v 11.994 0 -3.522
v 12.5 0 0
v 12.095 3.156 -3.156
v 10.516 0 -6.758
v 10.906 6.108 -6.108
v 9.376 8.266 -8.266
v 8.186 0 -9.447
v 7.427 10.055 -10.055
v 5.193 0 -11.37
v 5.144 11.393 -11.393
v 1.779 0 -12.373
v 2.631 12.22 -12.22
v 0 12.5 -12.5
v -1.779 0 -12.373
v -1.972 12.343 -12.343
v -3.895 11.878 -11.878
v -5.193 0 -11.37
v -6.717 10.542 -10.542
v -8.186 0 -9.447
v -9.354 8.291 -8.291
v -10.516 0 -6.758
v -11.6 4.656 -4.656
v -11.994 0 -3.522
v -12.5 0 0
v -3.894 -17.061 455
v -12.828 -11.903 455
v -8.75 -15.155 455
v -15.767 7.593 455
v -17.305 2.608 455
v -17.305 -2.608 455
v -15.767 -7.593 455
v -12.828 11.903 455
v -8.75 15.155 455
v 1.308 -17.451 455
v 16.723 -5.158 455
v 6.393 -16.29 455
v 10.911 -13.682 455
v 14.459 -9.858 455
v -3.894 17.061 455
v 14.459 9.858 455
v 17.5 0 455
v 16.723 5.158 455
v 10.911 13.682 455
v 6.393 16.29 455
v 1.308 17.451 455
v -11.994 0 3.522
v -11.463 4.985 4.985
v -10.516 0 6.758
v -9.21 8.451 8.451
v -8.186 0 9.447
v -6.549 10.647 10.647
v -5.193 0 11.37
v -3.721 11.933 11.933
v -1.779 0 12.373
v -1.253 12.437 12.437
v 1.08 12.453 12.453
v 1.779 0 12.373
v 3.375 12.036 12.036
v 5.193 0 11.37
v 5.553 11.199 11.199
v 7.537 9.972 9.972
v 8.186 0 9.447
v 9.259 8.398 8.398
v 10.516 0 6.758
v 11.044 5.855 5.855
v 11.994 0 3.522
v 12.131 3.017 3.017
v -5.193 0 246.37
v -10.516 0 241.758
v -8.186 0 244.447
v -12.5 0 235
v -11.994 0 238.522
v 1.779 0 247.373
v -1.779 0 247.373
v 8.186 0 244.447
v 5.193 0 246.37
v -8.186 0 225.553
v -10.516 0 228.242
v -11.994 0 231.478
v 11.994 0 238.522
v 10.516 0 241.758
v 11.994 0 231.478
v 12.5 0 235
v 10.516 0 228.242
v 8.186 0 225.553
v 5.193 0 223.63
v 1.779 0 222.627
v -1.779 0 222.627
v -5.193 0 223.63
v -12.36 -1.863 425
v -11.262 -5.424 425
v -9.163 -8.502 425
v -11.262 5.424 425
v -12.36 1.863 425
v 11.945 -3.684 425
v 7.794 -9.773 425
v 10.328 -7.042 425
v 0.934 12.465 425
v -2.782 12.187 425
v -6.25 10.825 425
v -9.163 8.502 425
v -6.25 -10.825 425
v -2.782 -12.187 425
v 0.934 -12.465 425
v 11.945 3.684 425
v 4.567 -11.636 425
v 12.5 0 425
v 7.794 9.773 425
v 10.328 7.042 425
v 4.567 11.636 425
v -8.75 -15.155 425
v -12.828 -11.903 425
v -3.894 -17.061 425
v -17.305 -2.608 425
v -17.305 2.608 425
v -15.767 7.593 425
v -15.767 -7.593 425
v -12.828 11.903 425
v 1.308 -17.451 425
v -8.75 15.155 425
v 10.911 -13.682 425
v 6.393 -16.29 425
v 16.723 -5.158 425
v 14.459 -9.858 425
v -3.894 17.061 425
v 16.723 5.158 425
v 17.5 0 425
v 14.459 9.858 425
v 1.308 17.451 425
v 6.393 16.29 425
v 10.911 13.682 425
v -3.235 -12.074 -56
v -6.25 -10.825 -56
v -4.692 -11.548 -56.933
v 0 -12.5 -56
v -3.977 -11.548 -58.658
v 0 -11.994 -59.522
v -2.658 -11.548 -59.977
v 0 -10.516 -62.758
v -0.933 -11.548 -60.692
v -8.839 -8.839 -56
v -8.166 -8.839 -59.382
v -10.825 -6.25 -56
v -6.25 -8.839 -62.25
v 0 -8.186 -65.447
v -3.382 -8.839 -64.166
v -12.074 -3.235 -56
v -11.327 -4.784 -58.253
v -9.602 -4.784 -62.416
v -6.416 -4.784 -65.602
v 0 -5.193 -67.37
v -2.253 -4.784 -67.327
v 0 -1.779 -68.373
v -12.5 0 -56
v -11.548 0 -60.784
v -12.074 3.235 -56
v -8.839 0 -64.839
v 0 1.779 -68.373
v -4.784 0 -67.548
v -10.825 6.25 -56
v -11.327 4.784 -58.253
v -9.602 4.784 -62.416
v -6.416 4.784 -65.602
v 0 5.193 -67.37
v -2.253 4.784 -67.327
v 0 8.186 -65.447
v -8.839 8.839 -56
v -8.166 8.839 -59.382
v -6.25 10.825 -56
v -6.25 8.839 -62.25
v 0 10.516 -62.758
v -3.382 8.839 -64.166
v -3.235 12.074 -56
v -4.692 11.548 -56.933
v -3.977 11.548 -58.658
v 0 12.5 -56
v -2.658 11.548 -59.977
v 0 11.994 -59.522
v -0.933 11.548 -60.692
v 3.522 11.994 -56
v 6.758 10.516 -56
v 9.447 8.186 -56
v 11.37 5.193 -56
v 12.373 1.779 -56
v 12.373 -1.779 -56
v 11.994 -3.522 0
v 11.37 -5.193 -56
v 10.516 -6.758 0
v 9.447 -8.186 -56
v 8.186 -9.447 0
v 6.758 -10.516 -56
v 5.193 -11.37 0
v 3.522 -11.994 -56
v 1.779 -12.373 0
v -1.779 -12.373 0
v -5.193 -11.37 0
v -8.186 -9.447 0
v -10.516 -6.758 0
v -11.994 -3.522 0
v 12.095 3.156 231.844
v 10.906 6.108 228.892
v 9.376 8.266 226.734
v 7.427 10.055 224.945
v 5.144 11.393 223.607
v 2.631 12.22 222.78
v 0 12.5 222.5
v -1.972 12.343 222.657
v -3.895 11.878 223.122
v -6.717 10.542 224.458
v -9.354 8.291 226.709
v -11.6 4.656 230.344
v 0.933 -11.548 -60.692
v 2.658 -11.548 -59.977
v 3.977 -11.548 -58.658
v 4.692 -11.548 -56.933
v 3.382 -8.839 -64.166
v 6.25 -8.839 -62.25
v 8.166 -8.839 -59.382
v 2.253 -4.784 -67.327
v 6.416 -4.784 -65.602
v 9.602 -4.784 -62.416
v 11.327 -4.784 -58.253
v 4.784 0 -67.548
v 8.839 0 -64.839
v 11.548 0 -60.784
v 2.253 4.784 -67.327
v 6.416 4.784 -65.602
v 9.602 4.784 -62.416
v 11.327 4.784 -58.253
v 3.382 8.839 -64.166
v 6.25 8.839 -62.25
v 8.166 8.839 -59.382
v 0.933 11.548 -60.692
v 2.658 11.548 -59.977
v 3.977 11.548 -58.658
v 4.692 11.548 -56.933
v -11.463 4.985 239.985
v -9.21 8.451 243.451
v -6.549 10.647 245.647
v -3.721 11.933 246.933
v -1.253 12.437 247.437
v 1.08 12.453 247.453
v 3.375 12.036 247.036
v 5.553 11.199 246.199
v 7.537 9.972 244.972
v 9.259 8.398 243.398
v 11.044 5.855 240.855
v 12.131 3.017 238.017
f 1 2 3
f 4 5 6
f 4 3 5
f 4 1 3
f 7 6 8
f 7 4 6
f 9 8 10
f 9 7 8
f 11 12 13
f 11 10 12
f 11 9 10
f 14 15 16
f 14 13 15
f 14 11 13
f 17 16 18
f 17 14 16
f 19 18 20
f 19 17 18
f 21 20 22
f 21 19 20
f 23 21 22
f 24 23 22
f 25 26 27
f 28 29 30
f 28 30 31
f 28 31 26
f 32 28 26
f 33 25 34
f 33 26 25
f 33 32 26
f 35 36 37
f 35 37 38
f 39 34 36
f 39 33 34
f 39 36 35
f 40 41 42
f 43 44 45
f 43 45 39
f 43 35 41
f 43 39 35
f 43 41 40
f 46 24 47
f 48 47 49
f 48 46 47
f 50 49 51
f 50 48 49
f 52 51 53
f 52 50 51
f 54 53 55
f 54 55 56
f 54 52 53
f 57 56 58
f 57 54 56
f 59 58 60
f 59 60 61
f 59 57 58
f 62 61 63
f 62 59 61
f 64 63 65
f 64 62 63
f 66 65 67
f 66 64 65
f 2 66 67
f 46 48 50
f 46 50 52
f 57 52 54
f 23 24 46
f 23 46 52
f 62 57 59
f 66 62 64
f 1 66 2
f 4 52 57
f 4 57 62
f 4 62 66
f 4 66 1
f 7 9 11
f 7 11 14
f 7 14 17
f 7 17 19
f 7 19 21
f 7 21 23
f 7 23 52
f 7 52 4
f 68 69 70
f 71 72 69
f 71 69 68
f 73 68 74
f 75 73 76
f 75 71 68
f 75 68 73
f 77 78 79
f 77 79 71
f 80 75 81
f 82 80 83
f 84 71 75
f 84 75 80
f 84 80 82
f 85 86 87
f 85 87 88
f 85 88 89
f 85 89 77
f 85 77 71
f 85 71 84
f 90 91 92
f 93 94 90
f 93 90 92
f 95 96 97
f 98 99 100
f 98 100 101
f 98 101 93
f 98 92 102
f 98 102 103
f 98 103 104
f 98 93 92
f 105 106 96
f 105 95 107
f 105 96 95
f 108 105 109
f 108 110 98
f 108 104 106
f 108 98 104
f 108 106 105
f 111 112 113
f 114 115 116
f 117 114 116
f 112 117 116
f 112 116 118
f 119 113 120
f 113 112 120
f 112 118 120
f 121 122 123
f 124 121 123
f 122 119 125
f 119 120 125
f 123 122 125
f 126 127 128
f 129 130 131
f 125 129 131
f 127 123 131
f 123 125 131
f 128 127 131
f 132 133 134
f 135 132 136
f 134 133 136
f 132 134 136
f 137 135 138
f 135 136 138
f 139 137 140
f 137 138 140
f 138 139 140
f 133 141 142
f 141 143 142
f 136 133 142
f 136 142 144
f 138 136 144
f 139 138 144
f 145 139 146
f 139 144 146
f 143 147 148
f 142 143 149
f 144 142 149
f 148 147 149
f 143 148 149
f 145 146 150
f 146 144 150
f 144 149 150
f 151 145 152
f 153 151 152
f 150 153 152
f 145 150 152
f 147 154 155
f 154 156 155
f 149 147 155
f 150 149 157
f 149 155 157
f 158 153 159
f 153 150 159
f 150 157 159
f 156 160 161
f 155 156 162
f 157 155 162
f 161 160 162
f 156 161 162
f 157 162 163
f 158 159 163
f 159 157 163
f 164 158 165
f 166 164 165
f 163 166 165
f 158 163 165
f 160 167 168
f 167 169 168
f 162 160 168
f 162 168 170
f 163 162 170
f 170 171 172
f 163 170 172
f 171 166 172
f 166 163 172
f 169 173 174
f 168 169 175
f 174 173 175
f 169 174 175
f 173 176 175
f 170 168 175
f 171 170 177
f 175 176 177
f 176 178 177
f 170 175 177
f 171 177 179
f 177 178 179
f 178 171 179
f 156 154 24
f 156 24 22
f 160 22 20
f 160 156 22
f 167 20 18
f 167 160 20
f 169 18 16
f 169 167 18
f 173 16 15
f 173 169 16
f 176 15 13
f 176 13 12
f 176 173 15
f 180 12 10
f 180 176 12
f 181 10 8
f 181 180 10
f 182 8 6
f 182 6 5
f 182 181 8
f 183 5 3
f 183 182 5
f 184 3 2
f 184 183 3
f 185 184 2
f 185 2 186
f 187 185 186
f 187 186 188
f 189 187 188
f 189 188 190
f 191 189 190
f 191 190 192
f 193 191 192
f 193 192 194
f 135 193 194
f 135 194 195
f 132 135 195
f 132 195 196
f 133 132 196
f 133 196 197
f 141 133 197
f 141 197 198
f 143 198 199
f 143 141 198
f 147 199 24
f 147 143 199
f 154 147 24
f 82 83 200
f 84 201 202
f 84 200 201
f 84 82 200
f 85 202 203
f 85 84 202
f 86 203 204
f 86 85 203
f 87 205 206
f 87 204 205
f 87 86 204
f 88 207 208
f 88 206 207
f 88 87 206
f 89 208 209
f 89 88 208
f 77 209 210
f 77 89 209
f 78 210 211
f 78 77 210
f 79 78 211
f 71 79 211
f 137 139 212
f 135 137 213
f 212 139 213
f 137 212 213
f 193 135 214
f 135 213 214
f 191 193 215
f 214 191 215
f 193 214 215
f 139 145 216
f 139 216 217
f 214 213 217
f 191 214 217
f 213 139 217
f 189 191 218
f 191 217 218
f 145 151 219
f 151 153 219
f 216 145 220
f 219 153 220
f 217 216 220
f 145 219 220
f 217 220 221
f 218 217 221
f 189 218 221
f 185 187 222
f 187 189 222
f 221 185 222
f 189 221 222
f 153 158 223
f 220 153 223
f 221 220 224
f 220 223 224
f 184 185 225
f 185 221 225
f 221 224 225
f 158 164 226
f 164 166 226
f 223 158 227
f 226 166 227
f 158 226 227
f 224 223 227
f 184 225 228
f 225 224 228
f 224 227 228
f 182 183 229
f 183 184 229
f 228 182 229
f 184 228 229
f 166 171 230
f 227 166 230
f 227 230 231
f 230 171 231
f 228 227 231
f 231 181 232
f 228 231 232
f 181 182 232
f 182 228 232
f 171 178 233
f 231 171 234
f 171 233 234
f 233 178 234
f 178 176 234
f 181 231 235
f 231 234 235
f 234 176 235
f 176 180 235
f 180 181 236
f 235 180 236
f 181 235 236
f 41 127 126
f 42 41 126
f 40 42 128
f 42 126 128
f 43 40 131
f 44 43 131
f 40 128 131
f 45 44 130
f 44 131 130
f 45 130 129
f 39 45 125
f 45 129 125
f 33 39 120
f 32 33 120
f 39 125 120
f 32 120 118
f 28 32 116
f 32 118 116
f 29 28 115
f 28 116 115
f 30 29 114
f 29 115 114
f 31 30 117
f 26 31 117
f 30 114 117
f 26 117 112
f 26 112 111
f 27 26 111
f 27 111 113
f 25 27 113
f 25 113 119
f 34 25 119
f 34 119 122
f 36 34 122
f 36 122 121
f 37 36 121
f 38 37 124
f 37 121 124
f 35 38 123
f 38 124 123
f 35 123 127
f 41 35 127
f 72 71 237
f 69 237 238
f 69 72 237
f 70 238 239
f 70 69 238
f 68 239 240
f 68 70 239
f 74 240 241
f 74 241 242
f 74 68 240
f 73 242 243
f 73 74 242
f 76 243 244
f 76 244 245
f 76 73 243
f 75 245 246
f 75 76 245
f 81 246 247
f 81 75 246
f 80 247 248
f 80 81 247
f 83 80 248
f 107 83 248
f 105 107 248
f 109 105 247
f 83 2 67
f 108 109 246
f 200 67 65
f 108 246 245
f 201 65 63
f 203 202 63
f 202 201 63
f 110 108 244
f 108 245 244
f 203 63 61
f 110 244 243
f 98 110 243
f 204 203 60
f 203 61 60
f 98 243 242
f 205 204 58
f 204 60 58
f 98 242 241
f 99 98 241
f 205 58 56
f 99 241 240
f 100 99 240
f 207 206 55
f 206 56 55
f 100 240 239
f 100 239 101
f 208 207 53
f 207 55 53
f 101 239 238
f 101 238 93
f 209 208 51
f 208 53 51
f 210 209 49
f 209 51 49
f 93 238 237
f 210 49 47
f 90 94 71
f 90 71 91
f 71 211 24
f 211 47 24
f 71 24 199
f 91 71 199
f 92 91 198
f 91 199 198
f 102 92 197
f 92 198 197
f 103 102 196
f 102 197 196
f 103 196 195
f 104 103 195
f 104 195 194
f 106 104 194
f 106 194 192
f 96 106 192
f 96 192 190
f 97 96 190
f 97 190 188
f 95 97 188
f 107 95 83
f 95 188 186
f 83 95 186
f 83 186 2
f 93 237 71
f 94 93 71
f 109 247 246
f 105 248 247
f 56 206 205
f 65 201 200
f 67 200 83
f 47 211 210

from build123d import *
from build123d.topology import SkipClean

# Parameters (mm, degrees)
SKETCH1_R           = 12.5
BOSS_EXTRUDE1_DEPTH = 425
SKETCH3_R           = 17.5
BOSS_EXTRUDE2_DEPTH = 30
SKETCH7_R           = 12.5
CUT_EXTRUDE1_DEPTH  = 20
BOSS_EXTRUDE4_START = 212.5
SKETCH10_R          = 12.5
BOSS_EXTRUDE4_DEPTH = 212.5
SKETCH12_R          = 12.5
CUT_EXTRUDE2_DEPTH  = 212.5
SKETCH14_R          = 12.5
CUT_EXTRUDE3_DEPTH  = 106.25
SKETCH16_R          = 12.5
CUT_EXTRUDE4_DEPTH  = 50.25


with BuildPart() as part:
    # Sketch1 → Boss-Extrude1 (new body)
    with BuildSketch(Plane.XY):
        Circle(SKETCH1_R)
    extrude(amount=BOSS_EXTRUDE1_DEPTH)

    # Sketch7 → Cut-Extrude1 (cut)
    with BuildSketch(Plane(origin=(0, 0, 0), x_dir=(1, 0, 0), z_dir=(0, 1, 0))):
        with Locations((0, -235)):
            Circle(SKETCH7_R)
    extrude(amount=CUT_EXTRUDE1_DEPTH, mode=Mode.SUBTRACT)

    # Sketch10 → Boss-Extrude4 (add)
    with BuildSketch(Plane(origin=(0, 0, 0), x_dir=(-1, 0, 0), z_dir=(0, 0, -1)).offset(BOSS_EXTRUDE4_START)):
        Circle(SKETCH10_R)
    extrude(amount=-BOSS_EXTRUDE4_DEPTH)

    # Sketch12 → Cut-Extrude2 (cut)
    with BuildSketch(Plane(origin=(0, 0, 0), x_dir=(1, 0, 0), z_dir=(0, 1, 0))):
        Circle(SKETCH12_R)
    extrude(amount=CUT_EXTRUDE2_DEPTH, mode=Mode.SUBTRACT)

    # Sketch14 → Cut-Extrude3 (cut)
    with BuildSketch(Plane(origin=(0, 0, -212.5), x_dir=(-1, 0, 0), z_dir=(0, 0, -1))):
        Circle(SKETCH14_R)
    extrude(amount=-CUT_EXTRUDE3_DEPTH, mode=Mode.SUBTRACT)

    # Sketch16 → Cut-Extrude4 (cut)
    with BuildSketch(Plane(origin=(0, 0, -106.25), x_dir=(-1, 0, 0), z_dir=(0, 0, -1))):
        Circle(SKETCH16_R)
    extrude(amount=-CUT_EXTRUDE4_DEPTH, mode=Mode.SUBTRACT)

    # Sketch17 → Revolve3 (revolve)
    with SkipClean():  # the faces are left unmerged after this step: merging them gives an invalid solid
        with BuildSketch(Plane(origin=(0, 0, 0), x_dir=(0, 0, -1), z_dir=(1, 0, 0))):
            with BuildLine():
                Line((56, 12.5), (56, -12.5))
                ThreePointArc((56, -12.5), (68.5, 0), (56, 12.5))
            make_face()
        revolve(axis=Axis((0, 12.5, -56), (0, -1, 0)))


with BuildPart() as body_2:
    # Sketch3 → Boss-Extrude2 (new body)
    with BuildSketch(Plane.XY.offset(425)):
        Circle(SKETCH3_R)
    extrude(amount=BOSS_EXTRUDE2_DEPTH)


solid = Compound([part.part, body_2.part])
